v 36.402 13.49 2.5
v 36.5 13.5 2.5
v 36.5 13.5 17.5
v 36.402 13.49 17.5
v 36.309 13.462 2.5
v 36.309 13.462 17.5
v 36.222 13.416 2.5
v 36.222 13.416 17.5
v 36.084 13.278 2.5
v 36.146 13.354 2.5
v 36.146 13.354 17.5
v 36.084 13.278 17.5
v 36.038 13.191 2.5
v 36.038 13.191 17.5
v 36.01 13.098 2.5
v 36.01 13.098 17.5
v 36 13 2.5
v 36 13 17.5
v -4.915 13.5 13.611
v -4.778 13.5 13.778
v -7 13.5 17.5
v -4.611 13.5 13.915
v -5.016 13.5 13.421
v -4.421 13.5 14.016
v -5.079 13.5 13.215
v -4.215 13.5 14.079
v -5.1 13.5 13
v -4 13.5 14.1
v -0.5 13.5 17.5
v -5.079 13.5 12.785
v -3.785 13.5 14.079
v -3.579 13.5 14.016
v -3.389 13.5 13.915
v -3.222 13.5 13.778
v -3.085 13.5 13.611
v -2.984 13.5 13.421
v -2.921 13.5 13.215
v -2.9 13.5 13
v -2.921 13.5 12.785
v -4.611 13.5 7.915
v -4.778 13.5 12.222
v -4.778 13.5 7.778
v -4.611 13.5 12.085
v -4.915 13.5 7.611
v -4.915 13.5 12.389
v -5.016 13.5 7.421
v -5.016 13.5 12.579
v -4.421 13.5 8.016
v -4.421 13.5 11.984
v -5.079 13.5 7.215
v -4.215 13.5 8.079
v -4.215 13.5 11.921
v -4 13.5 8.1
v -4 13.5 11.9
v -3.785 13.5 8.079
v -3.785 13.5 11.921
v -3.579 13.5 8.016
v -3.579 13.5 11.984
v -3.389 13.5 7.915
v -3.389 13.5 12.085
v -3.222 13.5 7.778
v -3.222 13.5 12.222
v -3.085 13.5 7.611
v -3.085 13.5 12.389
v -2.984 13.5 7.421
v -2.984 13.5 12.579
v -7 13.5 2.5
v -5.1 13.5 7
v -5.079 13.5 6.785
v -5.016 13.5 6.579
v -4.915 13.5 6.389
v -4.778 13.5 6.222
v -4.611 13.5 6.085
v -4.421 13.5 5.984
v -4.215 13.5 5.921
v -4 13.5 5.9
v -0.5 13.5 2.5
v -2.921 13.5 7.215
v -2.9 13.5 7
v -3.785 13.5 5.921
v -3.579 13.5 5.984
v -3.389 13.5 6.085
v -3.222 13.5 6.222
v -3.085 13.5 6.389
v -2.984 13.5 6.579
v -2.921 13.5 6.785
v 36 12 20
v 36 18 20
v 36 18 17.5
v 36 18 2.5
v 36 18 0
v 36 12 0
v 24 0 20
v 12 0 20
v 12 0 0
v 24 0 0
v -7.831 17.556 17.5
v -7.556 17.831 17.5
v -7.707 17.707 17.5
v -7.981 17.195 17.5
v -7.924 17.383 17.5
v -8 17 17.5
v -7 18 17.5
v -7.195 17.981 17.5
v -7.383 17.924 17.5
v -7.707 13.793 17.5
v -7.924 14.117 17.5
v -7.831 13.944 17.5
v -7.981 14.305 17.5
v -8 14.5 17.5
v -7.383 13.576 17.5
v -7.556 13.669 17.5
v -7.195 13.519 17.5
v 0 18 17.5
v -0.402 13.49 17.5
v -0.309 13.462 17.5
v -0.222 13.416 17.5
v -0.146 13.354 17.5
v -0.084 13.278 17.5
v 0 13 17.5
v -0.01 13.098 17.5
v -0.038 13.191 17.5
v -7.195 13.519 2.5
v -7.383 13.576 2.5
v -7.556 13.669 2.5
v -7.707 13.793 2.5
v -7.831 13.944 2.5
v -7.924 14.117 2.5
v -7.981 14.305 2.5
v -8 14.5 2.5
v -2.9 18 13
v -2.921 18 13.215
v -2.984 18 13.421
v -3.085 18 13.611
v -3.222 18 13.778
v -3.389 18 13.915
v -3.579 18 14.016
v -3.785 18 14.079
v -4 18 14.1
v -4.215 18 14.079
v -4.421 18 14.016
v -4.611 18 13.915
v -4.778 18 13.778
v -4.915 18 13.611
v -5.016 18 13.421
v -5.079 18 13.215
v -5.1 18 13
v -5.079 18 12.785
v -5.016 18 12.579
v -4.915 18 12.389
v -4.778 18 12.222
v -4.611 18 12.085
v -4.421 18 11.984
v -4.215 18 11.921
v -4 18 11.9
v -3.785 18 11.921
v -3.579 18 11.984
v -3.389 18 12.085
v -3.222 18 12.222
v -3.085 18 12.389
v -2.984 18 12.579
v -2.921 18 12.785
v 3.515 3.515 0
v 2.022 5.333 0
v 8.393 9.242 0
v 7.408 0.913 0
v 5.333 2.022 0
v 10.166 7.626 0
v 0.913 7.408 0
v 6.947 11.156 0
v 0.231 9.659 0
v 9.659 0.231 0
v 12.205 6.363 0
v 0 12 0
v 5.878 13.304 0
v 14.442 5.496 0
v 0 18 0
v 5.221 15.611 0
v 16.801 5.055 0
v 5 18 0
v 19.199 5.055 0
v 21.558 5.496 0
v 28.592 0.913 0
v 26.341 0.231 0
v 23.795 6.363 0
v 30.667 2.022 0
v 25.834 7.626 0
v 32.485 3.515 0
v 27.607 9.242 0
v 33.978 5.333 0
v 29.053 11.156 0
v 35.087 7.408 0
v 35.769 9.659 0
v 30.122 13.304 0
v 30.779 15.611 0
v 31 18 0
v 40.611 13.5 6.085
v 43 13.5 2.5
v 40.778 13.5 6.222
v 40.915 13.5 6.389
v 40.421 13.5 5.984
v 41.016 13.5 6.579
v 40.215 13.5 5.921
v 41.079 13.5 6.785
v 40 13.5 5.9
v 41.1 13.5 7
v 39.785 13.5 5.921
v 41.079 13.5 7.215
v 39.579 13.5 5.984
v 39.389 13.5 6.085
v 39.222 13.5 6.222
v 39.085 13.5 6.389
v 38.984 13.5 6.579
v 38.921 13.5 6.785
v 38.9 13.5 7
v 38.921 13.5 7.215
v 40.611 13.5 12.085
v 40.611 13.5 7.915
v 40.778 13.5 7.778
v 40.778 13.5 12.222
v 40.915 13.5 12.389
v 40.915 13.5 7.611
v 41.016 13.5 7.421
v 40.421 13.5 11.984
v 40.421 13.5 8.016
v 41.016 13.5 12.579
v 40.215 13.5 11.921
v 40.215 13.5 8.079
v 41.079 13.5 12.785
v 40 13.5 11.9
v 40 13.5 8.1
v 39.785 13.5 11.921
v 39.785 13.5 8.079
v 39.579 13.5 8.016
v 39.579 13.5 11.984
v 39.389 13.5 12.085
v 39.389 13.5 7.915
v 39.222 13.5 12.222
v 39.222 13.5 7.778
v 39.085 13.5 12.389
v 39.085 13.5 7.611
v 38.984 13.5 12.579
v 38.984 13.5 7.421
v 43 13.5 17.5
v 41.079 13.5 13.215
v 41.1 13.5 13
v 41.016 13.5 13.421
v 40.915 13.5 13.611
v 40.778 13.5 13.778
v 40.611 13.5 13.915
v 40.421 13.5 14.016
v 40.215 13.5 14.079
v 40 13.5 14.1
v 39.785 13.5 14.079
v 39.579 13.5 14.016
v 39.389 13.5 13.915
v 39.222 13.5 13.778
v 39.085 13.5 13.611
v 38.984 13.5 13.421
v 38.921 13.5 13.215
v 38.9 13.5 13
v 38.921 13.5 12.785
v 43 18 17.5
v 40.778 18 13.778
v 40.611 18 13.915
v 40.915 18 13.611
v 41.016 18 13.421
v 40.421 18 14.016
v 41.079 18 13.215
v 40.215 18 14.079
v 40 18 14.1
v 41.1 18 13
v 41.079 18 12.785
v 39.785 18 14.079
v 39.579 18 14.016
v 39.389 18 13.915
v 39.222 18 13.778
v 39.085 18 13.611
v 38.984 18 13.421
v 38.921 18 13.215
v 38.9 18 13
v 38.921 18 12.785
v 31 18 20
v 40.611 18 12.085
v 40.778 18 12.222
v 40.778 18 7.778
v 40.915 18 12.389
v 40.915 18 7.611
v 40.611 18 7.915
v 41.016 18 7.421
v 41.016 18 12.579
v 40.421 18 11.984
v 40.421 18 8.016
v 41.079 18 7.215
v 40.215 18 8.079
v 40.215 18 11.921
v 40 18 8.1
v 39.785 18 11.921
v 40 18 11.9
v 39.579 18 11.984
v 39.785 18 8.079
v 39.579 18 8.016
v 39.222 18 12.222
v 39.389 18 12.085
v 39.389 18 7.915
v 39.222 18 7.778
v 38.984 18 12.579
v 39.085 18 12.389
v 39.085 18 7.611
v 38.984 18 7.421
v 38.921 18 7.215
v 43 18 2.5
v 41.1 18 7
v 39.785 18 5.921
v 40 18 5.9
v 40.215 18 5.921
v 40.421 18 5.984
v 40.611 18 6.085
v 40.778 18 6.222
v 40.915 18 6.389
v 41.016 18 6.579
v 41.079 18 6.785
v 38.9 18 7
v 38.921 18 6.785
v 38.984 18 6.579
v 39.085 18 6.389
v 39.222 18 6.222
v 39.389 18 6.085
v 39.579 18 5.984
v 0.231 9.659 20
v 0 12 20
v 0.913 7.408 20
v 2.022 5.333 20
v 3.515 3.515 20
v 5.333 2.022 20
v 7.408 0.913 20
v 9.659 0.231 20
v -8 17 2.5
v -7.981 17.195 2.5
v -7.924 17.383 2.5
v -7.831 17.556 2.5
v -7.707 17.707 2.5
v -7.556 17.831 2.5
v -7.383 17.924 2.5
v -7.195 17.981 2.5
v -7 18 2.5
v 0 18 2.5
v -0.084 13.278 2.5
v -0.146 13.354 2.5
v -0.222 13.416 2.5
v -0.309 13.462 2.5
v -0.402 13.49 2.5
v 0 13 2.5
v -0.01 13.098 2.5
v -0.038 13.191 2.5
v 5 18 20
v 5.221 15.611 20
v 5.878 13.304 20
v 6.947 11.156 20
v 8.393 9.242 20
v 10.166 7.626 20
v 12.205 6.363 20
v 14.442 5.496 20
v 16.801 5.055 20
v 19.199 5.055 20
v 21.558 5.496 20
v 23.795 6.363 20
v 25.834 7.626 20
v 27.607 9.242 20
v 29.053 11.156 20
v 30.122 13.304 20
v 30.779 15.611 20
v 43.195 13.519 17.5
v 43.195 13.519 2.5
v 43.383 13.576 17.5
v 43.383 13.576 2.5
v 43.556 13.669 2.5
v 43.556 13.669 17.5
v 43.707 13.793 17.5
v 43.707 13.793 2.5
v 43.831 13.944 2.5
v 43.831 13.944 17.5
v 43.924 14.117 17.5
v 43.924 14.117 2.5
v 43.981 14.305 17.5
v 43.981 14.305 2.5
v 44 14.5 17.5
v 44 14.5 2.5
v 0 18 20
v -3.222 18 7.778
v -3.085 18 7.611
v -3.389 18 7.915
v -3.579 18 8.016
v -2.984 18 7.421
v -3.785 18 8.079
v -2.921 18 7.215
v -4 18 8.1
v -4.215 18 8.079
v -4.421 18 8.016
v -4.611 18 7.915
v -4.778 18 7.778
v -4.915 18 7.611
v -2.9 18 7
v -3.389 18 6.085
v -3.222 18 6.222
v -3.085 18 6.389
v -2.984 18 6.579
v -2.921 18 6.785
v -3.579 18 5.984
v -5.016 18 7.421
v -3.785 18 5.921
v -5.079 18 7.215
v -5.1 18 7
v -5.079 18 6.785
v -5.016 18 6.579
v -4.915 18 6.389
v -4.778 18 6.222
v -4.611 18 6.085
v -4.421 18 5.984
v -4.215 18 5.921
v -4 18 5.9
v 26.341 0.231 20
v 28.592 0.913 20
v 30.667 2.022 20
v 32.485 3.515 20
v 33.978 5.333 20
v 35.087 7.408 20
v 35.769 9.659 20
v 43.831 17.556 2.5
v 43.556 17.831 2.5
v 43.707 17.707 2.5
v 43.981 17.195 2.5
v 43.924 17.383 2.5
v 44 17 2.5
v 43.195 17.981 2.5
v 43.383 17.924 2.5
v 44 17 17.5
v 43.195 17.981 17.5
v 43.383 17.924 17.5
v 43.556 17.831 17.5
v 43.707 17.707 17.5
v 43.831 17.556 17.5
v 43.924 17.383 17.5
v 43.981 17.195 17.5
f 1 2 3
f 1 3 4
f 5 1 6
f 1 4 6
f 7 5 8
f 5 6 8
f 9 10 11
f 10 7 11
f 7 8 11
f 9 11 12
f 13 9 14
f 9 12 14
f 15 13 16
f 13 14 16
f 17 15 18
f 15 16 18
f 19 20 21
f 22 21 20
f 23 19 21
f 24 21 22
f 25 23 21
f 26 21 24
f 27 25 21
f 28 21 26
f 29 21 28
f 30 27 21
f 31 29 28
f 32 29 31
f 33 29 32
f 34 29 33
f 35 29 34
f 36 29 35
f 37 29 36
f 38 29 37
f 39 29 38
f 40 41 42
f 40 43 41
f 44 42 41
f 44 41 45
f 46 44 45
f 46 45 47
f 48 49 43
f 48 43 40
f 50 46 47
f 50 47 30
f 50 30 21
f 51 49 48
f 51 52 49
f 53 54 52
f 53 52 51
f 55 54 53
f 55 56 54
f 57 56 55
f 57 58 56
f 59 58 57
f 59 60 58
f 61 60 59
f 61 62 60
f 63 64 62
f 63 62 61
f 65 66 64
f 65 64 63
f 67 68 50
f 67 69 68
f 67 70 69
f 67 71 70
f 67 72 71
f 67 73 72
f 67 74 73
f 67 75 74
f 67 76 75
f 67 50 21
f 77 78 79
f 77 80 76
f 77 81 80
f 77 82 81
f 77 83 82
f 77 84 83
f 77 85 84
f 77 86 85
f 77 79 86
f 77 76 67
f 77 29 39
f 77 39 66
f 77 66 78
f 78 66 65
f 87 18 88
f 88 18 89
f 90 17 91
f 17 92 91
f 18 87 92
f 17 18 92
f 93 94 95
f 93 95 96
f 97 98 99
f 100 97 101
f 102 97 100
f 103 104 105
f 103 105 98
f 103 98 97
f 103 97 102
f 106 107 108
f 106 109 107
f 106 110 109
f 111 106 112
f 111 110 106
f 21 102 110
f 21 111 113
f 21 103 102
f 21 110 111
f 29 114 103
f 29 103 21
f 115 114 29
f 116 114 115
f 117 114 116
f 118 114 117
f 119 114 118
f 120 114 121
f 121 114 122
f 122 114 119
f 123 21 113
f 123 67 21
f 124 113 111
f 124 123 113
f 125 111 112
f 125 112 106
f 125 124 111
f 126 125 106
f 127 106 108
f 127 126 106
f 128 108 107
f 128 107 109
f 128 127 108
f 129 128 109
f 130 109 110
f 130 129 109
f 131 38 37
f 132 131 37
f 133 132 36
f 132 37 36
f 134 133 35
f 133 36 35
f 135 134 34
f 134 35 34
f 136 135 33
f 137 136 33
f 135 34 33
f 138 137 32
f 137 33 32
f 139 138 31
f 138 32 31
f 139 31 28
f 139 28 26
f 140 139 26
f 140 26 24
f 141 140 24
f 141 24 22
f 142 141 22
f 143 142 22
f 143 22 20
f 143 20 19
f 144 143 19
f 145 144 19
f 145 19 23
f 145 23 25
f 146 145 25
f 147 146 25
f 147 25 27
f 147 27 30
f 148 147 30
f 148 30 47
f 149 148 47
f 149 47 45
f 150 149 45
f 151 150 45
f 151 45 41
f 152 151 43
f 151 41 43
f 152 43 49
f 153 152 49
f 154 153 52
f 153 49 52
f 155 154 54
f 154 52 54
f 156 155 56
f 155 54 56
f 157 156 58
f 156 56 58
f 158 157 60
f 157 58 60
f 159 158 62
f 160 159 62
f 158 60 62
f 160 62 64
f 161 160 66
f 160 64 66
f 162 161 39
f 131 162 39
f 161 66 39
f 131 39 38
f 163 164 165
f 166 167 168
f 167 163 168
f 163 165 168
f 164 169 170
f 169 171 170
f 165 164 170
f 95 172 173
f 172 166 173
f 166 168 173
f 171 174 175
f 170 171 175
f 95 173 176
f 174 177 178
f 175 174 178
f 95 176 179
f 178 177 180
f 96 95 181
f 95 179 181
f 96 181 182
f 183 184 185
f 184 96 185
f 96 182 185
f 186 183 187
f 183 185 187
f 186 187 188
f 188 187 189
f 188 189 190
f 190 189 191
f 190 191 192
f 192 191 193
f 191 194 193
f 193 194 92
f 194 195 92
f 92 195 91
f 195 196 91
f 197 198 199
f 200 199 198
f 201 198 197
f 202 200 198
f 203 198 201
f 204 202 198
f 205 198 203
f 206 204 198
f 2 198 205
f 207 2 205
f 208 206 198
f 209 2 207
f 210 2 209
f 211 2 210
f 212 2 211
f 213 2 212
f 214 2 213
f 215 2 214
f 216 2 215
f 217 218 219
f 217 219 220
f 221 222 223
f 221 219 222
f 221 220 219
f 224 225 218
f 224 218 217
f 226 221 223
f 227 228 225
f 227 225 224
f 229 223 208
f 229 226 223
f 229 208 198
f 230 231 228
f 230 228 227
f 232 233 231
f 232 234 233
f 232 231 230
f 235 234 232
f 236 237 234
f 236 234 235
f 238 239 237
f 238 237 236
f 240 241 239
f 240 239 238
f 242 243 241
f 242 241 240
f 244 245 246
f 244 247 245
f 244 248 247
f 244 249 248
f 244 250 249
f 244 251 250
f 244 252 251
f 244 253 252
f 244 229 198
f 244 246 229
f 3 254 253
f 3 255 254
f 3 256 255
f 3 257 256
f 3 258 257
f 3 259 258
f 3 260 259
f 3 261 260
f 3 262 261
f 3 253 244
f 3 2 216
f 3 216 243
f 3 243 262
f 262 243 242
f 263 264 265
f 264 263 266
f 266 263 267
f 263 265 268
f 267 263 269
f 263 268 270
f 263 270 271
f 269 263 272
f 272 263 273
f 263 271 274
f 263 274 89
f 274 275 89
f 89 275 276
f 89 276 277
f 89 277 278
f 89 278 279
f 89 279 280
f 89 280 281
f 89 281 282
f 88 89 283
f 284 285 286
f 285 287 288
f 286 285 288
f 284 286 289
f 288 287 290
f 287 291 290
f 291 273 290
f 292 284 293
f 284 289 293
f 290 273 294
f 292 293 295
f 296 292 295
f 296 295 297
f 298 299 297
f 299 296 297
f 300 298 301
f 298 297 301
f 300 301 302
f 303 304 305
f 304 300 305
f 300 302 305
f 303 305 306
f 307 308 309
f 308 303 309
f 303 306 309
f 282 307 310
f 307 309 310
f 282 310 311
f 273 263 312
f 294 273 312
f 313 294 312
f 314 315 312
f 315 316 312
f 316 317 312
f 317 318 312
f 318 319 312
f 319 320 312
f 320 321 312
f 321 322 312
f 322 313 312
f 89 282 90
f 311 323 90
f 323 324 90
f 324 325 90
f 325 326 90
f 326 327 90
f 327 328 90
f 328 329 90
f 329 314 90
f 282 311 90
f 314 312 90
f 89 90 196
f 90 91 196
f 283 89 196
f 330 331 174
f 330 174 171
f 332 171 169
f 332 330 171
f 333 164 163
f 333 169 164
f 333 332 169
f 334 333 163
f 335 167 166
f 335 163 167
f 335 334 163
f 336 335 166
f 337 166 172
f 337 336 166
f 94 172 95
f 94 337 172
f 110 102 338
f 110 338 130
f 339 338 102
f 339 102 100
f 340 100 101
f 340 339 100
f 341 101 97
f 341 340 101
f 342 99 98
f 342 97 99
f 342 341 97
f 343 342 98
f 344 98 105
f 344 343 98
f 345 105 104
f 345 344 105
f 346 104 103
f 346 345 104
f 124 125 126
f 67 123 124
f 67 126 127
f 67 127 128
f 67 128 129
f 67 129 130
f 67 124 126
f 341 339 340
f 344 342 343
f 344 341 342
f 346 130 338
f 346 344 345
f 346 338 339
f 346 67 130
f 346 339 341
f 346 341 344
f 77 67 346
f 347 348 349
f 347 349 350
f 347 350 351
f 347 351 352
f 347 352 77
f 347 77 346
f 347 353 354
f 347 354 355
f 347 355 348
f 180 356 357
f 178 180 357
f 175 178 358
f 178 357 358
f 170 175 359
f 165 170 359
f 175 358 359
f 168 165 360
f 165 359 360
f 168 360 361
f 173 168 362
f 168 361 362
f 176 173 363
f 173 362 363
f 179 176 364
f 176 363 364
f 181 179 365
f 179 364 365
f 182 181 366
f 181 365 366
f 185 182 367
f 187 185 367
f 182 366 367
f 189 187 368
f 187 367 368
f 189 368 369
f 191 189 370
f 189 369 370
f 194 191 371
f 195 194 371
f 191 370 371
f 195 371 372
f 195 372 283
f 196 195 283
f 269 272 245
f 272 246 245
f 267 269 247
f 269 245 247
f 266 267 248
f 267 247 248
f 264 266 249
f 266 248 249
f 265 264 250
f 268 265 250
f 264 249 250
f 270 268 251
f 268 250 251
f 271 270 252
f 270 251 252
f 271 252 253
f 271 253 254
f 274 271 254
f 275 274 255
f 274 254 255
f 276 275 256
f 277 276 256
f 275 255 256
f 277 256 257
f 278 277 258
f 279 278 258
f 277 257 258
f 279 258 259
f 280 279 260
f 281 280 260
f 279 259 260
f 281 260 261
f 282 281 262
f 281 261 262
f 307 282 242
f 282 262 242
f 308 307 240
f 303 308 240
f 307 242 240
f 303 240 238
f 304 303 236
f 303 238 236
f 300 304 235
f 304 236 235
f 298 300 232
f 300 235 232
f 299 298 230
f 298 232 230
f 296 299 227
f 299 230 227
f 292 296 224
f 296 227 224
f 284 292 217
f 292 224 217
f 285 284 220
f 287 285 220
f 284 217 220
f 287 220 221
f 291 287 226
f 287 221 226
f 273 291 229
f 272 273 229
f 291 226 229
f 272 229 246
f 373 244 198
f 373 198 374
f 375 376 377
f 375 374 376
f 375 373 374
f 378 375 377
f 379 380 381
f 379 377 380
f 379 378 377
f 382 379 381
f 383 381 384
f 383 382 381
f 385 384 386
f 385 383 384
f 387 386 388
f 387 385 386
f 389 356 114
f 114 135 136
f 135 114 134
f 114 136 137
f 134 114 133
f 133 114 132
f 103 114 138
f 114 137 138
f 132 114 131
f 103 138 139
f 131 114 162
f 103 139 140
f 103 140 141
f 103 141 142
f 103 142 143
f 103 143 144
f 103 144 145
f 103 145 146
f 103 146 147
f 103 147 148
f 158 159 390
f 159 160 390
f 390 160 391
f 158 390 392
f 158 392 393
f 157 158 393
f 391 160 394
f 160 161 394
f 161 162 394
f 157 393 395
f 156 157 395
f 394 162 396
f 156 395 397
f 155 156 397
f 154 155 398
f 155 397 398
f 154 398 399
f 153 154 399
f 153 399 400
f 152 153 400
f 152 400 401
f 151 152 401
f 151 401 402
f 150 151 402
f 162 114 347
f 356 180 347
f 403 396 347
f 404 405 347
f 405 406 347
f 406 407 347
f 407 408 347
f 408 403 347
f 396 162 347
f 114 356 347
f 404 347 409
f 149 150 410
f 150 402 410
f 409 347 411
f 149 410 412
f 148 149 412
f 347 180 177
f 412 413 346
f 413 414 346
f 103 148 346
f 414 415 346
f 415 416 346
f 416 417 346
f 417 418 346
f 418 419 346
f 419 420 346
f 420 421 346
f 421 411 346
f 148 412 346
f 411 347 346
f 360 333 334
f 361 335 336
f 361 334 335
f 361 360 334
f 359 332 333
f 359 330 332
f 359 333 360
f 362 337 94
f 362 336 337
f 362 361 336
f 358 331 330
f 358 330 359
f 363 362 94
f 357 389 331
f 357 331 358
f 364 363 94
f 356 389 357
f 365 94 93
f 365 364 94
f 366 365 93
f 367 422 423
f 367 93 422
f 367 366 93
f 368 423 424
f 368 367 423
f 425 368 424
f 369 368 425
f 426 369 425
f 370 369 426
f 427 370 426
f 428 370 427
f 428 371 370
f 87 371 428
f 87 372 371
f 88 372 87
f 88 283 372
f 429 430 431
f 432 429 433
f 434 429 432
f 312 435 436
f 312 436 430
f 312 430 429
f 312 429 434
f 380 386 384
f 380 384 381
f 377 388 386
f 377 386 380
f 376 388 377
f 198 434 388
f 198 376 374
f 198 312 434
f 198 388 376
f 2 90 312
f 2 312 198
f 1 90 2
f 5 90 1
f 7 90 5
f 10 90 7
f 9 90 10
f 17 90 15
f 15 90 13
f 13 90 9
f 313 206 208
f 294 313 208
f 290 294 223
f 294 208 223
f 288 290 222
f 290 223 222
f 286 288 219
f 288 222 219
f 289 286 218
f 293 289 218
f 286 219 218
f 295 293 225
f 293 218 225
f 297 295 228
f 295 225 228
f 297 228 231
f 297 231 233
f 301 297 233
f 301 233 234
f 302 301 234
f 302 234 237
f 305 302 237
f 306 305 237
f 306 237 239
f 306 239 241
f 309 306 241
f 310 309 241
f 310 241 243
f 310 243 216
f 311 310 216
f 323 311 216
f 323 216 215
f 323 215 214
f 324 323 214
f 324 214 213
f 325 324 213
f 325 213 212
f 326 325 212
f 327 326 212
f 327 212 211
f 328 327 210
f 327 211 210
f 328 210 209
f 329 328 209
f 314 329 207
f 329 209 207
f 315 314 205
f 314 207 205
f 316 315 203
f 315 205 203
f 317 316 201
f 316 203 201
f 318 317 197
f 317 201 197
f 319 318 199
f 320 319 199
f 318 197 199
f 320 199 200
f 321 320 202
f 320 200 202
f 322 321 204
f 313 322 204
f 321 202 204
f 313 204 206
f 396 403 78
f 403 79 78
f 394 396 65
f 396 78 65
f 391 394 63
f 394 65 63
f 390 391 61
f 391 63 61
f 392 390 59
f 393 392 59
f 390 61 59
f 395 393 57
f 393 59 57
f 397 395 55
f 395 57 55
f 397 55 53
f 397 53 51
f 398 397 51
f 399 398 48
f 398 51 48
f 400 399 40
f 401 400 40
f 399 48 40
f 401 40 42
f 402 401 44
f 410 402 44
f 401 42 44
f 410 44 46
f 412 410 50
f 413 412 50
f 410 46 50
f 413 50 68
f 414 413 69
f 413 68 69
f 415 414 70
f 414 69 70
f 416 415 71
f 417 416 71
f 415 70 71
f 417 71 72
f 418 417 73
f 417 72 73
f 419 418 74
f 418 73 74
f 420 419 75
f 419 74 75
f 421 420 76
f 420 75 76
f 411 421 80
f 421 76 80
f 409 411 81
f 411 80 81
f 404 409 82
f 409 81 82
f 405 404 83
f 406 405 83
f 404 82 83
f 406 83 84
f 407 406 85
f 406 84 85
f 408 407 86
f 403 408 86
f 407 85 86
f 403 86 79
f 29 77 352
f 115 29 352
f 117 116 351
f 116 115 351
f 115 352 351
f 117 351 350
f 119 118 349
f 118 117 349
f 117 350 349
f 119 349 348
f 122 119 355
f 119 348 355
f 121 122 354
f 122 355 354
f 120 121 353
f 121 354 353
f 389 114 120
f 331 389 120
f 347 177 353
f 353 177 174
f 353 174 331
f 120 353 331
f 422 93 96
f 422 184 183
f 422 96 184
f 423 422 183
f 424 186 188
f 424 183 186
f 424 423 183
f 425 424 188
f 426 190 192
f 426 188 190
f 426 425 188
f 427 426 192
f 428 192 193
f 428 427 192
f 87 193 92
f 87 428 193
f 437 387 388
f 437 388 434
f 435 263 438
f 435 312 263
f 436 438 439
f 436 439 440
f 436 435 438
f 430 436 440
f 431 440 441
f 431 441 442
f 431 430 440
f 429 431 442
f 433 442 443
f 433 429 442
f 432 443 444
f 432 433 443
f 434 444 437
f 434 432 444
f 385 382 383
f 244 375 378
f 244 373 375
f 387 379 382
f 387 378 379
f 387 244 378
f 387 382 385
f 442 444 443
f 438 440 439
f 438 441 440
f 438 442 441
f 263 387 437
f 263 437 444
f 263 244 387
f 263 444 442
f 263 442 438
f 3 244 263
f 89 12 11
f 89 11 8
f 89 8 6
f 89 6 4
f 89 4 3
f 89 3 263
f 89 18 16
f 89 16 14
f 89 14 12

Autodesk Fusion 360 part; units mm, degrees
sketch "Sketch1" plane through (0, 0, 0) normal (0, 0, 1) x (1, 0, 0)
  line L0 (0, 0) -> (36, 0)
  line L1 (36, 0) -> (36, 18)
  line L2 (36, 18) -> (0, 18)
  line L3 (0, 18) -> (0, 0)
  dimension "d1" = 36
  dimension "d2" = 18
extrude "Extrude1" add sketch "Sketch1" along normal blind 20
sketch "Sketch2" plane through (0, 0, 20) normal (0, 0, 1) x (-1, 0, 0)
  line L0 (0, -18) -> (0, 0)
  line L1 (0, 0) -> (-36, 0)
  line L2 (-36, 0) -> (-36, -18)
  line L3 (-36, -18) -> (0, -18)
  circle A0 centre (-18, -18) radius 13
  dimension "d5" = 26
extrude "Extrude2" cut sketch "Sketch2" against normal blind 20 contours L3 A0 picked at (-19.0768, -11.2377)
ref_plane "WorkPlane1" through (0, 20, 0) normal (0, 1, 0) x (0, 0, 1)
sketch "Sketch7" plane through (0, 0, 0) normal (0, -1, 0) x (1, 0, 0)
  line L0 (0, 0) -> (36, 0)
  line L1 (36, 20) -> (0, 20)
  line L2 (0, 20) -> (0, 0)
  line L3 (18, 10) -> (18, 23) construction
  line L4 (36, 0) -> (36, 20)
sketch "Sketch6" plane through (36, 0, 0) normal (1, 0, 0) x (0, 1, 0)
  line L0 (0, 0) -> (18, 0)
  line L1 (18, 0) -> (18, 20)
  line L2 (18, 20) -> (0, 20)
  line L3 (0, 20) -> (0, 0)
  line L4 (0, 20) -> (18, 0) construction
  line L5 (0, 0) -> (18, 20) construction
  line L6 (9, 10) -> (18, 10) construction
  line L7 (9, 10) -> (9, 0) construction
  line L8 (9, 10) -> (9, 20) construction
  line L9 (13.5, 17.5) -> (18, 17.5) construction
  line L10 (13.5, 5) -> (13.5, 10) construction
  line L11 (18, 7.5) -> (18, 12.5311)
  line L12 (13.5, 17.5) -> (18, 17.5)
  line L13 (18, 17.5) -> (18, 2.5)
  line L14 (18, 2.5) -> (13.5, 2.5)
  line L15 (13.5, 2.5) -> (13.5, 17.5)
  dimension "d25" = 15
  dimension "d26" = 4.5
  dimension "d34" = 7.5
extrude "Extrude7" add sketch "Sketch6" along normal blind 8 contours L1 L11 L12 L13 L14 L15
sketch "Sketch11" plane through (0, 13.5, 0) normal (0, -1, 0) x (1, 0, 0)
  line L0 (36, 17.5) -> (36, 2.5)
  line L1 (36, 2.5) -> (44, 2.5)
  line L2 (44, 2.5) -> (44, 17.5)
  line L3 (44, 17.5) -> (36, 17.5)
  circle A0 centre (40, 13) radius 1.1
  circle A1 centre (40, 7) radius 1.1
  line L4 (36, 0) -> (36, 20)
  line L5 (36, 20) -> (0, 20)
  line L6 (18, 10) -> (18, 23)
  circle A2 centre (-4, 13) radius 1.1
  circle A3 centre (-4, 7) radius 1.1
  dimension "d30" = 2.2
  dimension "d31" = 2.2
  dimension "d35" = 6
  dimension "d36" = 4
  dimension "d37" = 4
  dimension "d38" = 7
sketch "Sketch12" plane through (0, 0, 0) normal (-1, 0, 0) x (0, -1, 0)
  line L0 (-18, 0) -> (0, 0)
  line L1 (0, 0) -> (0, 20)
  line L2 (0, 20) -> (-18, 20)
  line L3 (-18, 20) -> (-18, 0)
  line L4 (-18, 17.5) -> (-13.5, 17.5)
  line L5 (-13.5, 17.5) -> (-13.5, 2.5)
  line L6 (-13.5, 2.5) -> (-18, 2.5)
  line L7 (-18, 2.5) -> (-18, 17.5)
  line L8 (-18, 10) -> (-8, 10) construction
  dimension "d39" = 15
  dimension "d40" = 7.5
  dimension "d41" = 4.5
extrude "Extrude8" add sketch "Sketch12" along normal blind 8 contours L3 L4 L5 L6 L7
extrude "Extrude9" cut sketch "Sketch11" against normal blind 4.5 contours A0 | A1 | A2 | A3
fillet "Fillet4" radius 0.5 1 edges at (0, 13.5, 10)
fillet "Fillet5" radius 1 2 edges at (-8, 18, 10) (-8, 13.5, 10)
fillet "Fillet6" radius 1 2 edges at (44, 13.5, 10) (44, 18, 10)
fillet "Fillet7" radius 0.5 1 edges at (36, 13.5, 10)
fillet "Fillet9" radius 12 2 edges at (36, 0, 10) (0, 0, 10)
